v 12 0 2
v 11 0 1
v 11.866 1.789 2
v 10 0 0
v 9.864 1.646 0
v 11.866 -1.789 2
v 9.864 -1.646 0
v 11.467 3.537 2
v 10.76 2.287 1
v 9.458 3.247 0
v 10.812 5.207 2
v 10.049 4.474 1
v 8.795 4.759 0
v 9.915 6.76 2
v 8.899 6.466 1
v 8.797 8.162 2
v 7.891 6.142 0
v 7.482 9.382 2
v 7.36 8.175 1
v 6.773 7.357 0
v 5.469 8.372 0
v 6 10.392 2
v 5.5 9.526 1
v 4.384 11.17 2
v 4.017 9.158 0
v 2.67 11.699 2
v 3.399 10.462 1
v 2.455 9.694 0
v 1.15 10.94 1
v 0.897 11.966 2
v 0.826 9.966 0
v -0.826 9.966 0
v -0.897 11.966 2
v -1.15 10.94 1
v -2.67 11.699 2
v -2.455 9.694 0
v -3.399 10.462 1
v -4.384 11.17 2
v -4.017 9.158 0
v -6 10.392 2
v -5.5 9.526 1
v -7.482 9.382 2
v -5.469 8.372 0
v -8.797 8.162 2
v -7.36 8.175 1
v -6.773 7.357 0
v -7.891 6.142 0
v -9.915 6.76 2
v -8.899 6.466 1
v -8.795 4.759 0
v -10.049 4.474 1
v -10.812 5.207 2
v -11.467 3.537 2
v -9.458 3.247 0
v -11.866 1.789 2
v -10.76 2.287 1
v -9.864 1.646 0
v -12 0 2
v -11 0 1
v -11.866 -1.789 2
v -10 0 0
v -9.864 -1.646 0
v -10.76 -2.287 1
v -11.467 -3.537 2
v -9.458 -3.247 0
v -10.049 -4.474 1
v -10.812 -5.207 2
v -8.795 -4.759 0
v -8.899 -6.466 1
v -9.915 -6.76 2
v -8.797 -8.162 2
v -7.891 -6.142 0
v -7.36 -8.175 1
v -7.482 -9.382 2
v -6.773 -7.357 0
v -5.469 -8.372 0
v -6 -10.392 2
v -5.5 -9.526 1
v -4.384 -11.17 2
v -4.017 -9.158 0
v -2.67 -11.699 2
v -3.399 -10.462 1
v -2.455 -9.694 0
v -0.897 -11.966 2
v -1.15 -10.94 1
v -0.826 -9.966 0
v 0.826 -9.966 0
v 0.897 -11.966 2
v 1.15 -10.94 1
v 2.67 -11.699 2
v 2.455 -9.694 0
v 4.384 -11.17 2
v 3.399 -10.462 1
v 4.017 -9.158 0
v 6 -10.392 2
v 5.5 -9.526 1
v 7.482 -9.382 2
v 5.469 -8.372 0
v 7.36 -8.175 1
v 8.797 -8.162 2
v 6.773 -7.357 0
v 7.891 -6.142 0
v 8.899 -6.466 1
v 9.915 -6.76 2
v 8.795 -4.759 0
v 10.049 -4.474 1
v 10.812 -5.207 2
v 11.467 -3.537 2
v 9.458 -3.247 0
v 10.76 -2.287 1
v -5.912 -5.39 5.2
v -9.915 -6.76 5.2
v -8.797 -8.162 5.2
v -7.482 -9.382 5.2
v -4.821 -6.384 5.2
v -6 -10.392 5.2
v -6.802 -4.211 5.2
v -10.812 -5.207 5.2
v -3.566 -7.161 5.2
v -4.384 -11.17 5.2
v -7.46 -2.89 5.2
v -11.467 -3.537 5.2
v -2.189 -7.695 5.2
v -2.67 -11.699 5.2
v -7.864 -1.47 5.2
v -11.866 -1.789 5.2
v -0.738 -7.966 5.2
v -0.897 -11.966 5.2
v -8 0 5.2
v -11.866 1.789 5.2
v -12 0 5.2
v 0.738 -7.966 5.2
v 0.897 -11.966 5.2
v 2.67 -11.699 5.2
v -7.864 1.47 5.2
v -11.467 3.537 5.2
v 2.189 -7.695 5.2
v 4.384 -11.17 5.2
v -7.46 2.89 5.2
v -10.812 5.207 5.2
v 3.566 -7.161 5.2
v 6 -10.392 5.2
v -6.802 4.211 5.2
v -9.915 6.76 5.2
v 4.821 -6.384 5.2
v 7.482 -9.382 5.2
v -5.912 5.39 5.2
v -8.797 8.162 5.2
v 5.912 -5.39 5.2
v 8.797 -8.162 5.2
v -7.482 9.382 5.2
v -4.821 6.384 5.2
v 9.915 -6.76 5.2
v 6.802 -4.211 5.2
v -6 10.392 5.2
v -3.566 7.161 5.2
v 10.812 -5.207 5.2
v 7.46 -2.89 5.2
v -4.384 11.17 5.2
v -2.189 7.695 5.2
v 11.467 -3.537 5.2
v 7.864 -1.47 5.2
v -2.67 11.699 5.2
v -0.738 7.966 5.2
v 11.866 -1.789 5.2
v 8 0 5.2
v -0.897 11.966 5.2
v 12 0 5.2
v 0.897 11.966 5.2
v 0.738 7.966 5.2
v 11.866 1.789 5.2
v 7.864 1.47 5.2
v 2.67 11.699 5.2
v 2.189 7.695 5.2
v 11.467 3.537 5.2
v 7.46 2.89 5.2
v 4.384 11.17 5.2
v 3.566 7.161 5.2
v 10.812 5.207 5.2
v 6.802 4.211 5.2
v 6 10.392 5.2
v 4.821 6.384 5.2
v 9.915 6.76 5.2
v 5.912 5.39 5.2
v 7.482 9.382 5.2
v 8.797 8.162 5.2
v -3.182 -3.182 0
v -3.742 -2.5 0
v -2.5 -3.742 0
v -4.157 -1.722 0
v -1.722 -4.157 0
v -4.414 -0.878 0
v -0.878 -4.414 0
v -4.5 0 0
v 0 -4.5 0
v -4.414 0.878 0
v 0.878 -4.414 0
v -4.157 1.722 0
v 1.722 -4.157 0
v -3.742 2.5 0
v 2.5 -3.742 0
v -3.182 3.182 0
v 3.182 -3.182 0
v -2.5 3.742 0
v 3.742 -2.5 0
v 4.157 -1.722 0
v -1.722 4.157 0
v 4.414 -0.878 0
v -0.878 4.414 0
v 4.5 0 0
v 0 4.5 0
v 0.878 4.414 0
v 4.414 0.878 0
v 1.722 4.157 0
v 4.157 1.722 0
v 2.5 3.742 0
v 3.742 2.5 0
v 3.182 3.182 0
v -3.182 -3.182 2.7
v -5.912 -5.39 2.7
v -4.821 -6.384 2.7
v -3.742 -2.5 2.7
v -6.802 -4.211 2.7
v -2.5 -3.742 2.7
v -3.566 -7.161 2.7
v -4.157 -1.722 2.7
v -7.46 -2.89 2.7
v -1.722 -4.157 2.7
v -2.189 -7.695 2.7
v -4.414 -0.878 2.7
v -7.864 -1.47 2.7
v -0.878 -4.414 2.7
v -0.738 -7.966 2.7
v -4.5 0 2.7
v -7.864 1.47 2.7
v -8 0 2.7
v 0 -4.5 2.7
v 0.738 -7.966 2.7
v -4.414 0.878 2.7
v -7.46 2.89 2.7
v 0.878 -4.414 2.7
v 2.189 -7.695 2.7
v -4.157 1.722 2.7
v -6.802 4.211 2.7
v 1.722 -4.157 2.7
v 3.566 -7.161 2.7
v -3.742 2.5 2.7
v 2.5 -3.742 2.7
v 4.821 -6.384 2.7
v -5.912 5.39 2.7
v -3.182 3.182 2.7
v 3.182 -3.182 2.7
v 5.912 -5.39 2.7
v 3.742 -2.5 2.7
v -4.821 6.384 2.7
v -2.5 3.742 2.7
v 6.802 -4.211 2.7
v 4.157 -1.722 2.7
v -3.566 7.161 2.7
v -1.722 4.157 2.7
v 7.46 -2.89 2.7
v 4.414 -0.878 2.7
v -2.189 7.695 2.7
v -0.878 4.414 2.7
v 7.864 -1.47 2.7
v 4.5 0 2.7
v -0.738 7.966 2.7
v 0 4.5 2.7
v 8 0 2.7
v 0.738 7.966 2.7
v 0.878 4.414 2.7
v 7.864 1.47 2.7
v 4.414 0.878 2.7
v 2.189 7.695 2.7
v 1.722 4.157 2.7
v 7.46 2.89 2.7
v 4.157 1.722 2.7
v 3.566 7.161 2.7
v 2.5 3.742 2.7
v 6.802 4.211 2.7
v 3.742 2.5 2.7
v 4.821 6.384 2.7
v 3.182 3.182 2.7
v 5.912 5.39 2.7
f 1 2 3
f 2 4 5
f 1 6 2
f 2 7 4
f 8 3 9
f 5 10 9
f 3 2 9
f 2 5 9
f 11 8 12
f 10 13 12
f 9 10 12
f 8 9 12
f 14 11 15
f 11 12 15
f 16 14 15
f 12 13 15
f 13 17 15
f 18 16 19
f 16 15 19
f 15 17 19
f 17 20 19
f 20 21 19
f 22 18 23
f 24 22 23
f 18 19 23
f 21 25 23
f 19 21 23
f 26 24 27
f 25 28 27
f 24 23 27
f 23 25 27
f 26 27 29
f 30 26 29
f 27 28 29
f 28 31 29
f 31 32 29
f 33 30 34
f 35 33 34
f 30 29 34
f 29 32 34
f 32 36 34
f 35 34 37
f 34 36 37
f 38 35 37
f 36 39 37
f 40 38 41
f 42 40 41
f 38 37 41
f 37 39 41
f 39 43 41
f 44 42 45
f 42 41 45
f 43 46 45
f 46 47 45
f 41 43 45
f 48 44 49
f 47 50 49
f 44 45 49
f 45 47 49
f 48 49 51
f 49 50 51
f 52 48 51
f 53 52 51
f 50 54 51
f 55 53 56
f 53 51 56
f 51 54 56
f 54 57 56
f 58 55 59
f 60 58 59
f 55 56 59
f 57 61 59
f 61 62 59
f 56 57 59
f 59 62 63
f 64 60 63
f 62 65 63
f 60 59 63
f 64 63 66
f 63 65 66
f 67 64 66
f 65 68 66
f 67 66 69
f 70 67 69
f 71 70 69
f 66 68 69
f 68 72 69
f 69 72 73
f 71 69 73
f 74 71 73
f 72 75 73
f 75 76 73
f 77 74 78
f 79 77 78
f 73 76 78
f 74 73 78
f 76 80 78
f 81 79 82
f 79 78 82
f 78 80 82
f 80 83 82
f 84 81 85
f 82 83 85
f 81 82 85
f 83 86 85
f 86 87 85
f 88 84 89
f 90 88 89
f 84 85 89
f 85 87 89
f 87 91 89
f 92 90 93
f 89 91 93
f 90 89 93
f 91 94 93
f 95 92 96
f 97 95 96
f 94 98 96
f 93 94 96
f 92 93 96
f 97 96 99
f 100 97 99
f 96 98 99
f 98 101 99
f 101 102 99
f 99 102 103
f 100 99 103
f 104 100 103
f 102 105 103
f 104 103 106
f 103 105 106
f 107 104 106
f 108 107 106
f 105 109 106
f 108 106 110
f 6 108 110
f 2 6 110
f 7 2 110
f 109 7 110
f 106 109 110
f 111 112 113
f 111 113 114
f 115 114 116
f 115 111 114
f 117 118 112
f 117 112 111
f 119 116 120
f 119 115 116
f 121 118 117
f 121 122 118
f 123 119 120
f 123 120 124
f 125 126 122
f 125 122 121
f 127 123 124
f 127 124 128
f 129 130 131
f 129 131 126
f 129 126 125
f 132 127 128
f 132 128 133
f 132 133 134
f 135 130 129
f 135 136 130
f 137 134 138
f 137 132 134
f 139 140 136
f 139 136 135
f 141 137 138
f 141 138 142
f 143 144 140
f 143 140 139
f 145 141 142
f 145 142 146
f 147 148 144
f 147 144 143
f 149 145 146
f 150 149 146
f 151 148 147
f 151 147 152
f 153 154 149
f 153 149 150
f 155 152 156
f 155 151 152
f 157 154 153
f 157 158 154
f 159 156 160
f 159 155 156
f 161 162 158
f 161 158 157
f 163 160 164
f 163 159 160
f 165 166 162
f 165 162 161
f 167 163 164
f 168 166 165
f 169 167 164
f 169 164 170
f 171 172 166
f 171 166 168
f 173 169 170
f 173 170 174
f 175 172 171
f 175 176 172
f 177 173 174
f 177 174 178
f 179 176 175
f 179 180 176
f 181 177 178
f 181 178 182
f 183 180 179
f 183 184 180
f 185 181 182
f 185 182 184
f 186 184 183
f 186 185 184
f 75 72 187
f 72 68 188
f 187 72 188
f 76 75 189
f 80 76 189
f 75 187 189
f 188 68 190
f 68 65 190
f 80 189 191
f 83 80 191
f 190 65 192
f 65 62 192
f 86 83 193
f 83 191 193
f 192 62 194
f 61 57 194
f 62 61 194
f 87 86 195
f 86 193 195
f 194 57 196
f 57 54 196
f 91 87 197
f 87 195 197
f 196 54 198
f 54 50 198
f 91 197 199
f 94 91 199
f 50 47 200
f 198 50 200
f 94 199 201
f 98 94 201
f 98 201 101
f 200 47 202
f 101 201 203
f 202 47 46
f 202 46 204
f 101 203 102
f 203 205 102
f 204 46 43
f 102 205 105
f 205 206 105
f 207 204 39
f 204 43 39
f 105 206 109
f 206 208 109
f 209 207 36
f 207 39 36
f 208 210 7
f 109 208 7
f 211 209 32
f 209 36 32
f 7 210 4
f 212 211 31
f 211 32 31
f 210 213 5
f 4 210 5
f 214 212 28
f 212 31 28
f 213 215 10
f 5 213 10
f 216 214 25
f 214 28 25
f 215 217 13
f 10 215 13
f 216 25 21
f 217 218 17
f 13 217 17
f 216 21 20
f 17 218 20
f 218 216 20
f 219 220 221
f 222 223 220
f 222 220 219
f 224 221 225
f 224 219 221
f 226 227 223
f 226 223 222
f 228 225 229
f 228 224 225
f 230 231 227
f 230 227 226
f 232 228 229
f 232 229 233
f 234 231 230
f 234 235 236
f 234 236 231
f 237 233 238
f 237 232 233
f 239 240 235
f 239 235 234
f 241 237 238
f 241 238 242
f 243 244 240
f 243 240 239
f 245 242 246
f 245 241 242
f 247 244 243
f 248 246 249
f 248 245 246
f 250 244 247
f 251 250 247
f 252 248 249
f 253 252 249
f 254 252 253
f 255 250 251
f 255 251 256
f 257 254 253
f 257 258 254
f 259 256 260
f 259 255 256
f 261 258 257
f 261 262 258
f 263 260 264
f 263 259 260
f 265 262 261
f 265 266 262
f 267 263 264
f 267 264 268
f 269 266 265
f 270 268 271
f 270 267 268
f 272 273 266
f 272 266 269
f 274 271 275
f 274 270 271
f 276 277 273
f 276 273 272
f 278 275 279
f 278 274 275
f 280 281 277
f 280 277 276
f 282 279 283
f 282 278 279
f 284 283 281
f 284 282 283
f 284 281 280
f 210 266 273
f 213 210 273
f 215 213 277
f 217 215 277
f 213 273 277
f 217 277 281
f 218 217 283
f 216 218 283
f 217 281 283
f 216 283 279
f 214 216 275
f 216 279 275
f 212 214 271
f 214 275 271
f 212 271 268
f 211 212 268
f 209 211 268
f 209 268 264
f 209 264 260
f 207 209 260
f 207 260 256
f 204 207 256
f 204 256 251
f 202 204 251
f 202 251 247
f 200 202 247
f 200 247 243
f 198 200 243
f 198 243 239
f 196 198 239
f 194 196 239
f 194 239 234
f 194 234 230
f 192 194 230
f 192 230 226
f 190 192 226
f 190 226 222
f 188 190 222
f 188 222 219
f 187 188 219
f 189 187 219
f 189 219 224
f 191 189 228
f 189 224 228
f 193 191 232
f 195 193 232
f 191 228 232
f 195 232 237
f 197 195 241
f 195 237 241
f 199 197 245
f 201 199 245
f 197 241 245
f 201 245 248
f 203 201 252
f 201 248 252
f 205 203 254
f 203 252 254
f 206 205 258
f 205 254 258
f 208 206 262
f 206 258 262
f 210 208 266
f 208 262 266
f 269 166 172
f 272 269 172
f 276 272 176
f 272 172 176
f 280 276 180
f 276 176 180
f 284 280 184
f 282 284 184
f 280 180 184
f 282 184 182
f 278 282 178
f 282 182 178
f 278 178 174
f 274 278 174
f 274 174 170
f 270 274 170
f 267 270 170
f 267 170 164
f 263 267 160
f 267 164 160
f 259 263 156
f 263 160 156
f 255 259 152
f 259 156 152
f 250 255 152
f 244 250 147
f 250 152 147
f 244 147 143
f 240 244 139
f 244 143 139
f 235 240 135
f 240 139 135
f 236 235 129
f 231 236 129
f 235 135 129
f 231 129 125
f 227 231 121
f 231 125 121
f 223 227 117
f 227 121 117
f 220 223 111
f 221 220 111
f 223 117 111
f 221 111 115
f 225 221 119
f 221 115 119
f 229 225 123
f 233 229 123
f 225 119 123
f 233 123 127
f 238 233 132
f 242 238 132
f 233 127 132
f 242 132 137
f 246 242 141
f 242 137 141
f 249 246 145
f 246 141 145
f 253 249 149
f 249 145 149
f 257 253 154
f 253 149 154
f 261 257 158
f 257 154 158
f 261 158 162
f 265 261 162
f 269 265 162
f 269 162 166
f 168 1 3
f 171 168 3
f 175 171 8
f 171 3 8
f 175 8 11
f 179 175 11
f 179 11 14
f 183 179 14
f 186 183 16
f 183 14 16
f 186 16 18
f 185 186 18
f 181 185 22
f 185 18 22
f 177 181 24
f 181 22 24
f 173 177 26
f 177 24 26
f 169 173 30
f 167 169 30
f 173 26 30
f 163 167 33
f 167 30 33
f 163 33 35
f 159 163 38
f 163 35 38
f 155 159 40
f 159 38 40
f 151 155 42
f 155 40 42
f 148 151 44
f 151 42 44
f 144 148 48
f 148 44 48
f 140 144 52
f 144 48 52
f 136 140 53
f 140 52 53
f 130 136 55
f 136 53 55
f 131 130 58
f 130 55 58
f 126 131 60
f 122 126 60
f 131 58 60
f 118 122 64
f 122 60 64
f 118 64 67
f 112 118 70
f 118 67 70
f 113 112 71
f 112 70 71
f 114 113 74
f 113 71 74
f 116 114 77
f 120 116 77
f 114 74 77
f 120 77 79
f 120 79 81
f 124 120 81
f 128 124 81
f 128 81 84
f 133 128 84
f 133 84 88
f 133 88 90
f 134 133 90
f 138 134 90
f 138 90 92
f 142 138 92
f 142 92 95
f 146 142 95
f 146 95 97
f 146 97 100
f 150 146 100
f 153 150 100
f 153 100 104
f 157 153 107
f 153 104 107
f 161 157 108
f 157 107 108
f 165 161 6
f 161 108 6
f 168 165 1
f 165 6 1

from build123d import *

# Parameters (mm, degrees)
IZIM4_R                     = 12
Y_KSEKLIK_EKSTR_ZYON3_DEPTH = 5.2
IZIM6_R                     = 8
KES_EKSTR_ZYON2_DEPTH       = 2.5
IZIM7_R                     = 4.5
KES_EKSTR_ZYON3_DEPTH       = 12.6
PAH3_SIZE                   = 2


with BuildPart() as part:
    # Çizim4 → Yükseklik-Ekstrüzyon3 (new body)
    with BuildSketch(Plane.XY):
        Circle(IZIM4_R)
    extrude(amount=Y_KSEKLIK_EKSTR_ZYON3_DEPTH)

    # Çizim6 → Kes-Ekstrüzyon2 (cut)
    with BuildSketch(Plane.XY.offset(5.2)):
        Circle(IZIM6_R)
    extrude(amount=-KES_EKSTR_ZYON2_DEPTH, mode=Mode.SUBTRACT)

    # Çizim7 → Kes-Ekstrüzyon3 (cut)
    with BuildSketch(Plane.XY.offset(2.7)):
        Circle(IZIM7_R)
    extrude(amount=-KES_EKSTR_ZYON3_DEPTH, mode=Mode.SUBTRACT)

    # Pah3
    pah3_edges = [part.edges().sort_by_distance(p)[0] for p in [
        (-12, 0, 0),
    ]]
    chamfer(pah3_edges, length=PAH3_SIZE)


solid = part.part
